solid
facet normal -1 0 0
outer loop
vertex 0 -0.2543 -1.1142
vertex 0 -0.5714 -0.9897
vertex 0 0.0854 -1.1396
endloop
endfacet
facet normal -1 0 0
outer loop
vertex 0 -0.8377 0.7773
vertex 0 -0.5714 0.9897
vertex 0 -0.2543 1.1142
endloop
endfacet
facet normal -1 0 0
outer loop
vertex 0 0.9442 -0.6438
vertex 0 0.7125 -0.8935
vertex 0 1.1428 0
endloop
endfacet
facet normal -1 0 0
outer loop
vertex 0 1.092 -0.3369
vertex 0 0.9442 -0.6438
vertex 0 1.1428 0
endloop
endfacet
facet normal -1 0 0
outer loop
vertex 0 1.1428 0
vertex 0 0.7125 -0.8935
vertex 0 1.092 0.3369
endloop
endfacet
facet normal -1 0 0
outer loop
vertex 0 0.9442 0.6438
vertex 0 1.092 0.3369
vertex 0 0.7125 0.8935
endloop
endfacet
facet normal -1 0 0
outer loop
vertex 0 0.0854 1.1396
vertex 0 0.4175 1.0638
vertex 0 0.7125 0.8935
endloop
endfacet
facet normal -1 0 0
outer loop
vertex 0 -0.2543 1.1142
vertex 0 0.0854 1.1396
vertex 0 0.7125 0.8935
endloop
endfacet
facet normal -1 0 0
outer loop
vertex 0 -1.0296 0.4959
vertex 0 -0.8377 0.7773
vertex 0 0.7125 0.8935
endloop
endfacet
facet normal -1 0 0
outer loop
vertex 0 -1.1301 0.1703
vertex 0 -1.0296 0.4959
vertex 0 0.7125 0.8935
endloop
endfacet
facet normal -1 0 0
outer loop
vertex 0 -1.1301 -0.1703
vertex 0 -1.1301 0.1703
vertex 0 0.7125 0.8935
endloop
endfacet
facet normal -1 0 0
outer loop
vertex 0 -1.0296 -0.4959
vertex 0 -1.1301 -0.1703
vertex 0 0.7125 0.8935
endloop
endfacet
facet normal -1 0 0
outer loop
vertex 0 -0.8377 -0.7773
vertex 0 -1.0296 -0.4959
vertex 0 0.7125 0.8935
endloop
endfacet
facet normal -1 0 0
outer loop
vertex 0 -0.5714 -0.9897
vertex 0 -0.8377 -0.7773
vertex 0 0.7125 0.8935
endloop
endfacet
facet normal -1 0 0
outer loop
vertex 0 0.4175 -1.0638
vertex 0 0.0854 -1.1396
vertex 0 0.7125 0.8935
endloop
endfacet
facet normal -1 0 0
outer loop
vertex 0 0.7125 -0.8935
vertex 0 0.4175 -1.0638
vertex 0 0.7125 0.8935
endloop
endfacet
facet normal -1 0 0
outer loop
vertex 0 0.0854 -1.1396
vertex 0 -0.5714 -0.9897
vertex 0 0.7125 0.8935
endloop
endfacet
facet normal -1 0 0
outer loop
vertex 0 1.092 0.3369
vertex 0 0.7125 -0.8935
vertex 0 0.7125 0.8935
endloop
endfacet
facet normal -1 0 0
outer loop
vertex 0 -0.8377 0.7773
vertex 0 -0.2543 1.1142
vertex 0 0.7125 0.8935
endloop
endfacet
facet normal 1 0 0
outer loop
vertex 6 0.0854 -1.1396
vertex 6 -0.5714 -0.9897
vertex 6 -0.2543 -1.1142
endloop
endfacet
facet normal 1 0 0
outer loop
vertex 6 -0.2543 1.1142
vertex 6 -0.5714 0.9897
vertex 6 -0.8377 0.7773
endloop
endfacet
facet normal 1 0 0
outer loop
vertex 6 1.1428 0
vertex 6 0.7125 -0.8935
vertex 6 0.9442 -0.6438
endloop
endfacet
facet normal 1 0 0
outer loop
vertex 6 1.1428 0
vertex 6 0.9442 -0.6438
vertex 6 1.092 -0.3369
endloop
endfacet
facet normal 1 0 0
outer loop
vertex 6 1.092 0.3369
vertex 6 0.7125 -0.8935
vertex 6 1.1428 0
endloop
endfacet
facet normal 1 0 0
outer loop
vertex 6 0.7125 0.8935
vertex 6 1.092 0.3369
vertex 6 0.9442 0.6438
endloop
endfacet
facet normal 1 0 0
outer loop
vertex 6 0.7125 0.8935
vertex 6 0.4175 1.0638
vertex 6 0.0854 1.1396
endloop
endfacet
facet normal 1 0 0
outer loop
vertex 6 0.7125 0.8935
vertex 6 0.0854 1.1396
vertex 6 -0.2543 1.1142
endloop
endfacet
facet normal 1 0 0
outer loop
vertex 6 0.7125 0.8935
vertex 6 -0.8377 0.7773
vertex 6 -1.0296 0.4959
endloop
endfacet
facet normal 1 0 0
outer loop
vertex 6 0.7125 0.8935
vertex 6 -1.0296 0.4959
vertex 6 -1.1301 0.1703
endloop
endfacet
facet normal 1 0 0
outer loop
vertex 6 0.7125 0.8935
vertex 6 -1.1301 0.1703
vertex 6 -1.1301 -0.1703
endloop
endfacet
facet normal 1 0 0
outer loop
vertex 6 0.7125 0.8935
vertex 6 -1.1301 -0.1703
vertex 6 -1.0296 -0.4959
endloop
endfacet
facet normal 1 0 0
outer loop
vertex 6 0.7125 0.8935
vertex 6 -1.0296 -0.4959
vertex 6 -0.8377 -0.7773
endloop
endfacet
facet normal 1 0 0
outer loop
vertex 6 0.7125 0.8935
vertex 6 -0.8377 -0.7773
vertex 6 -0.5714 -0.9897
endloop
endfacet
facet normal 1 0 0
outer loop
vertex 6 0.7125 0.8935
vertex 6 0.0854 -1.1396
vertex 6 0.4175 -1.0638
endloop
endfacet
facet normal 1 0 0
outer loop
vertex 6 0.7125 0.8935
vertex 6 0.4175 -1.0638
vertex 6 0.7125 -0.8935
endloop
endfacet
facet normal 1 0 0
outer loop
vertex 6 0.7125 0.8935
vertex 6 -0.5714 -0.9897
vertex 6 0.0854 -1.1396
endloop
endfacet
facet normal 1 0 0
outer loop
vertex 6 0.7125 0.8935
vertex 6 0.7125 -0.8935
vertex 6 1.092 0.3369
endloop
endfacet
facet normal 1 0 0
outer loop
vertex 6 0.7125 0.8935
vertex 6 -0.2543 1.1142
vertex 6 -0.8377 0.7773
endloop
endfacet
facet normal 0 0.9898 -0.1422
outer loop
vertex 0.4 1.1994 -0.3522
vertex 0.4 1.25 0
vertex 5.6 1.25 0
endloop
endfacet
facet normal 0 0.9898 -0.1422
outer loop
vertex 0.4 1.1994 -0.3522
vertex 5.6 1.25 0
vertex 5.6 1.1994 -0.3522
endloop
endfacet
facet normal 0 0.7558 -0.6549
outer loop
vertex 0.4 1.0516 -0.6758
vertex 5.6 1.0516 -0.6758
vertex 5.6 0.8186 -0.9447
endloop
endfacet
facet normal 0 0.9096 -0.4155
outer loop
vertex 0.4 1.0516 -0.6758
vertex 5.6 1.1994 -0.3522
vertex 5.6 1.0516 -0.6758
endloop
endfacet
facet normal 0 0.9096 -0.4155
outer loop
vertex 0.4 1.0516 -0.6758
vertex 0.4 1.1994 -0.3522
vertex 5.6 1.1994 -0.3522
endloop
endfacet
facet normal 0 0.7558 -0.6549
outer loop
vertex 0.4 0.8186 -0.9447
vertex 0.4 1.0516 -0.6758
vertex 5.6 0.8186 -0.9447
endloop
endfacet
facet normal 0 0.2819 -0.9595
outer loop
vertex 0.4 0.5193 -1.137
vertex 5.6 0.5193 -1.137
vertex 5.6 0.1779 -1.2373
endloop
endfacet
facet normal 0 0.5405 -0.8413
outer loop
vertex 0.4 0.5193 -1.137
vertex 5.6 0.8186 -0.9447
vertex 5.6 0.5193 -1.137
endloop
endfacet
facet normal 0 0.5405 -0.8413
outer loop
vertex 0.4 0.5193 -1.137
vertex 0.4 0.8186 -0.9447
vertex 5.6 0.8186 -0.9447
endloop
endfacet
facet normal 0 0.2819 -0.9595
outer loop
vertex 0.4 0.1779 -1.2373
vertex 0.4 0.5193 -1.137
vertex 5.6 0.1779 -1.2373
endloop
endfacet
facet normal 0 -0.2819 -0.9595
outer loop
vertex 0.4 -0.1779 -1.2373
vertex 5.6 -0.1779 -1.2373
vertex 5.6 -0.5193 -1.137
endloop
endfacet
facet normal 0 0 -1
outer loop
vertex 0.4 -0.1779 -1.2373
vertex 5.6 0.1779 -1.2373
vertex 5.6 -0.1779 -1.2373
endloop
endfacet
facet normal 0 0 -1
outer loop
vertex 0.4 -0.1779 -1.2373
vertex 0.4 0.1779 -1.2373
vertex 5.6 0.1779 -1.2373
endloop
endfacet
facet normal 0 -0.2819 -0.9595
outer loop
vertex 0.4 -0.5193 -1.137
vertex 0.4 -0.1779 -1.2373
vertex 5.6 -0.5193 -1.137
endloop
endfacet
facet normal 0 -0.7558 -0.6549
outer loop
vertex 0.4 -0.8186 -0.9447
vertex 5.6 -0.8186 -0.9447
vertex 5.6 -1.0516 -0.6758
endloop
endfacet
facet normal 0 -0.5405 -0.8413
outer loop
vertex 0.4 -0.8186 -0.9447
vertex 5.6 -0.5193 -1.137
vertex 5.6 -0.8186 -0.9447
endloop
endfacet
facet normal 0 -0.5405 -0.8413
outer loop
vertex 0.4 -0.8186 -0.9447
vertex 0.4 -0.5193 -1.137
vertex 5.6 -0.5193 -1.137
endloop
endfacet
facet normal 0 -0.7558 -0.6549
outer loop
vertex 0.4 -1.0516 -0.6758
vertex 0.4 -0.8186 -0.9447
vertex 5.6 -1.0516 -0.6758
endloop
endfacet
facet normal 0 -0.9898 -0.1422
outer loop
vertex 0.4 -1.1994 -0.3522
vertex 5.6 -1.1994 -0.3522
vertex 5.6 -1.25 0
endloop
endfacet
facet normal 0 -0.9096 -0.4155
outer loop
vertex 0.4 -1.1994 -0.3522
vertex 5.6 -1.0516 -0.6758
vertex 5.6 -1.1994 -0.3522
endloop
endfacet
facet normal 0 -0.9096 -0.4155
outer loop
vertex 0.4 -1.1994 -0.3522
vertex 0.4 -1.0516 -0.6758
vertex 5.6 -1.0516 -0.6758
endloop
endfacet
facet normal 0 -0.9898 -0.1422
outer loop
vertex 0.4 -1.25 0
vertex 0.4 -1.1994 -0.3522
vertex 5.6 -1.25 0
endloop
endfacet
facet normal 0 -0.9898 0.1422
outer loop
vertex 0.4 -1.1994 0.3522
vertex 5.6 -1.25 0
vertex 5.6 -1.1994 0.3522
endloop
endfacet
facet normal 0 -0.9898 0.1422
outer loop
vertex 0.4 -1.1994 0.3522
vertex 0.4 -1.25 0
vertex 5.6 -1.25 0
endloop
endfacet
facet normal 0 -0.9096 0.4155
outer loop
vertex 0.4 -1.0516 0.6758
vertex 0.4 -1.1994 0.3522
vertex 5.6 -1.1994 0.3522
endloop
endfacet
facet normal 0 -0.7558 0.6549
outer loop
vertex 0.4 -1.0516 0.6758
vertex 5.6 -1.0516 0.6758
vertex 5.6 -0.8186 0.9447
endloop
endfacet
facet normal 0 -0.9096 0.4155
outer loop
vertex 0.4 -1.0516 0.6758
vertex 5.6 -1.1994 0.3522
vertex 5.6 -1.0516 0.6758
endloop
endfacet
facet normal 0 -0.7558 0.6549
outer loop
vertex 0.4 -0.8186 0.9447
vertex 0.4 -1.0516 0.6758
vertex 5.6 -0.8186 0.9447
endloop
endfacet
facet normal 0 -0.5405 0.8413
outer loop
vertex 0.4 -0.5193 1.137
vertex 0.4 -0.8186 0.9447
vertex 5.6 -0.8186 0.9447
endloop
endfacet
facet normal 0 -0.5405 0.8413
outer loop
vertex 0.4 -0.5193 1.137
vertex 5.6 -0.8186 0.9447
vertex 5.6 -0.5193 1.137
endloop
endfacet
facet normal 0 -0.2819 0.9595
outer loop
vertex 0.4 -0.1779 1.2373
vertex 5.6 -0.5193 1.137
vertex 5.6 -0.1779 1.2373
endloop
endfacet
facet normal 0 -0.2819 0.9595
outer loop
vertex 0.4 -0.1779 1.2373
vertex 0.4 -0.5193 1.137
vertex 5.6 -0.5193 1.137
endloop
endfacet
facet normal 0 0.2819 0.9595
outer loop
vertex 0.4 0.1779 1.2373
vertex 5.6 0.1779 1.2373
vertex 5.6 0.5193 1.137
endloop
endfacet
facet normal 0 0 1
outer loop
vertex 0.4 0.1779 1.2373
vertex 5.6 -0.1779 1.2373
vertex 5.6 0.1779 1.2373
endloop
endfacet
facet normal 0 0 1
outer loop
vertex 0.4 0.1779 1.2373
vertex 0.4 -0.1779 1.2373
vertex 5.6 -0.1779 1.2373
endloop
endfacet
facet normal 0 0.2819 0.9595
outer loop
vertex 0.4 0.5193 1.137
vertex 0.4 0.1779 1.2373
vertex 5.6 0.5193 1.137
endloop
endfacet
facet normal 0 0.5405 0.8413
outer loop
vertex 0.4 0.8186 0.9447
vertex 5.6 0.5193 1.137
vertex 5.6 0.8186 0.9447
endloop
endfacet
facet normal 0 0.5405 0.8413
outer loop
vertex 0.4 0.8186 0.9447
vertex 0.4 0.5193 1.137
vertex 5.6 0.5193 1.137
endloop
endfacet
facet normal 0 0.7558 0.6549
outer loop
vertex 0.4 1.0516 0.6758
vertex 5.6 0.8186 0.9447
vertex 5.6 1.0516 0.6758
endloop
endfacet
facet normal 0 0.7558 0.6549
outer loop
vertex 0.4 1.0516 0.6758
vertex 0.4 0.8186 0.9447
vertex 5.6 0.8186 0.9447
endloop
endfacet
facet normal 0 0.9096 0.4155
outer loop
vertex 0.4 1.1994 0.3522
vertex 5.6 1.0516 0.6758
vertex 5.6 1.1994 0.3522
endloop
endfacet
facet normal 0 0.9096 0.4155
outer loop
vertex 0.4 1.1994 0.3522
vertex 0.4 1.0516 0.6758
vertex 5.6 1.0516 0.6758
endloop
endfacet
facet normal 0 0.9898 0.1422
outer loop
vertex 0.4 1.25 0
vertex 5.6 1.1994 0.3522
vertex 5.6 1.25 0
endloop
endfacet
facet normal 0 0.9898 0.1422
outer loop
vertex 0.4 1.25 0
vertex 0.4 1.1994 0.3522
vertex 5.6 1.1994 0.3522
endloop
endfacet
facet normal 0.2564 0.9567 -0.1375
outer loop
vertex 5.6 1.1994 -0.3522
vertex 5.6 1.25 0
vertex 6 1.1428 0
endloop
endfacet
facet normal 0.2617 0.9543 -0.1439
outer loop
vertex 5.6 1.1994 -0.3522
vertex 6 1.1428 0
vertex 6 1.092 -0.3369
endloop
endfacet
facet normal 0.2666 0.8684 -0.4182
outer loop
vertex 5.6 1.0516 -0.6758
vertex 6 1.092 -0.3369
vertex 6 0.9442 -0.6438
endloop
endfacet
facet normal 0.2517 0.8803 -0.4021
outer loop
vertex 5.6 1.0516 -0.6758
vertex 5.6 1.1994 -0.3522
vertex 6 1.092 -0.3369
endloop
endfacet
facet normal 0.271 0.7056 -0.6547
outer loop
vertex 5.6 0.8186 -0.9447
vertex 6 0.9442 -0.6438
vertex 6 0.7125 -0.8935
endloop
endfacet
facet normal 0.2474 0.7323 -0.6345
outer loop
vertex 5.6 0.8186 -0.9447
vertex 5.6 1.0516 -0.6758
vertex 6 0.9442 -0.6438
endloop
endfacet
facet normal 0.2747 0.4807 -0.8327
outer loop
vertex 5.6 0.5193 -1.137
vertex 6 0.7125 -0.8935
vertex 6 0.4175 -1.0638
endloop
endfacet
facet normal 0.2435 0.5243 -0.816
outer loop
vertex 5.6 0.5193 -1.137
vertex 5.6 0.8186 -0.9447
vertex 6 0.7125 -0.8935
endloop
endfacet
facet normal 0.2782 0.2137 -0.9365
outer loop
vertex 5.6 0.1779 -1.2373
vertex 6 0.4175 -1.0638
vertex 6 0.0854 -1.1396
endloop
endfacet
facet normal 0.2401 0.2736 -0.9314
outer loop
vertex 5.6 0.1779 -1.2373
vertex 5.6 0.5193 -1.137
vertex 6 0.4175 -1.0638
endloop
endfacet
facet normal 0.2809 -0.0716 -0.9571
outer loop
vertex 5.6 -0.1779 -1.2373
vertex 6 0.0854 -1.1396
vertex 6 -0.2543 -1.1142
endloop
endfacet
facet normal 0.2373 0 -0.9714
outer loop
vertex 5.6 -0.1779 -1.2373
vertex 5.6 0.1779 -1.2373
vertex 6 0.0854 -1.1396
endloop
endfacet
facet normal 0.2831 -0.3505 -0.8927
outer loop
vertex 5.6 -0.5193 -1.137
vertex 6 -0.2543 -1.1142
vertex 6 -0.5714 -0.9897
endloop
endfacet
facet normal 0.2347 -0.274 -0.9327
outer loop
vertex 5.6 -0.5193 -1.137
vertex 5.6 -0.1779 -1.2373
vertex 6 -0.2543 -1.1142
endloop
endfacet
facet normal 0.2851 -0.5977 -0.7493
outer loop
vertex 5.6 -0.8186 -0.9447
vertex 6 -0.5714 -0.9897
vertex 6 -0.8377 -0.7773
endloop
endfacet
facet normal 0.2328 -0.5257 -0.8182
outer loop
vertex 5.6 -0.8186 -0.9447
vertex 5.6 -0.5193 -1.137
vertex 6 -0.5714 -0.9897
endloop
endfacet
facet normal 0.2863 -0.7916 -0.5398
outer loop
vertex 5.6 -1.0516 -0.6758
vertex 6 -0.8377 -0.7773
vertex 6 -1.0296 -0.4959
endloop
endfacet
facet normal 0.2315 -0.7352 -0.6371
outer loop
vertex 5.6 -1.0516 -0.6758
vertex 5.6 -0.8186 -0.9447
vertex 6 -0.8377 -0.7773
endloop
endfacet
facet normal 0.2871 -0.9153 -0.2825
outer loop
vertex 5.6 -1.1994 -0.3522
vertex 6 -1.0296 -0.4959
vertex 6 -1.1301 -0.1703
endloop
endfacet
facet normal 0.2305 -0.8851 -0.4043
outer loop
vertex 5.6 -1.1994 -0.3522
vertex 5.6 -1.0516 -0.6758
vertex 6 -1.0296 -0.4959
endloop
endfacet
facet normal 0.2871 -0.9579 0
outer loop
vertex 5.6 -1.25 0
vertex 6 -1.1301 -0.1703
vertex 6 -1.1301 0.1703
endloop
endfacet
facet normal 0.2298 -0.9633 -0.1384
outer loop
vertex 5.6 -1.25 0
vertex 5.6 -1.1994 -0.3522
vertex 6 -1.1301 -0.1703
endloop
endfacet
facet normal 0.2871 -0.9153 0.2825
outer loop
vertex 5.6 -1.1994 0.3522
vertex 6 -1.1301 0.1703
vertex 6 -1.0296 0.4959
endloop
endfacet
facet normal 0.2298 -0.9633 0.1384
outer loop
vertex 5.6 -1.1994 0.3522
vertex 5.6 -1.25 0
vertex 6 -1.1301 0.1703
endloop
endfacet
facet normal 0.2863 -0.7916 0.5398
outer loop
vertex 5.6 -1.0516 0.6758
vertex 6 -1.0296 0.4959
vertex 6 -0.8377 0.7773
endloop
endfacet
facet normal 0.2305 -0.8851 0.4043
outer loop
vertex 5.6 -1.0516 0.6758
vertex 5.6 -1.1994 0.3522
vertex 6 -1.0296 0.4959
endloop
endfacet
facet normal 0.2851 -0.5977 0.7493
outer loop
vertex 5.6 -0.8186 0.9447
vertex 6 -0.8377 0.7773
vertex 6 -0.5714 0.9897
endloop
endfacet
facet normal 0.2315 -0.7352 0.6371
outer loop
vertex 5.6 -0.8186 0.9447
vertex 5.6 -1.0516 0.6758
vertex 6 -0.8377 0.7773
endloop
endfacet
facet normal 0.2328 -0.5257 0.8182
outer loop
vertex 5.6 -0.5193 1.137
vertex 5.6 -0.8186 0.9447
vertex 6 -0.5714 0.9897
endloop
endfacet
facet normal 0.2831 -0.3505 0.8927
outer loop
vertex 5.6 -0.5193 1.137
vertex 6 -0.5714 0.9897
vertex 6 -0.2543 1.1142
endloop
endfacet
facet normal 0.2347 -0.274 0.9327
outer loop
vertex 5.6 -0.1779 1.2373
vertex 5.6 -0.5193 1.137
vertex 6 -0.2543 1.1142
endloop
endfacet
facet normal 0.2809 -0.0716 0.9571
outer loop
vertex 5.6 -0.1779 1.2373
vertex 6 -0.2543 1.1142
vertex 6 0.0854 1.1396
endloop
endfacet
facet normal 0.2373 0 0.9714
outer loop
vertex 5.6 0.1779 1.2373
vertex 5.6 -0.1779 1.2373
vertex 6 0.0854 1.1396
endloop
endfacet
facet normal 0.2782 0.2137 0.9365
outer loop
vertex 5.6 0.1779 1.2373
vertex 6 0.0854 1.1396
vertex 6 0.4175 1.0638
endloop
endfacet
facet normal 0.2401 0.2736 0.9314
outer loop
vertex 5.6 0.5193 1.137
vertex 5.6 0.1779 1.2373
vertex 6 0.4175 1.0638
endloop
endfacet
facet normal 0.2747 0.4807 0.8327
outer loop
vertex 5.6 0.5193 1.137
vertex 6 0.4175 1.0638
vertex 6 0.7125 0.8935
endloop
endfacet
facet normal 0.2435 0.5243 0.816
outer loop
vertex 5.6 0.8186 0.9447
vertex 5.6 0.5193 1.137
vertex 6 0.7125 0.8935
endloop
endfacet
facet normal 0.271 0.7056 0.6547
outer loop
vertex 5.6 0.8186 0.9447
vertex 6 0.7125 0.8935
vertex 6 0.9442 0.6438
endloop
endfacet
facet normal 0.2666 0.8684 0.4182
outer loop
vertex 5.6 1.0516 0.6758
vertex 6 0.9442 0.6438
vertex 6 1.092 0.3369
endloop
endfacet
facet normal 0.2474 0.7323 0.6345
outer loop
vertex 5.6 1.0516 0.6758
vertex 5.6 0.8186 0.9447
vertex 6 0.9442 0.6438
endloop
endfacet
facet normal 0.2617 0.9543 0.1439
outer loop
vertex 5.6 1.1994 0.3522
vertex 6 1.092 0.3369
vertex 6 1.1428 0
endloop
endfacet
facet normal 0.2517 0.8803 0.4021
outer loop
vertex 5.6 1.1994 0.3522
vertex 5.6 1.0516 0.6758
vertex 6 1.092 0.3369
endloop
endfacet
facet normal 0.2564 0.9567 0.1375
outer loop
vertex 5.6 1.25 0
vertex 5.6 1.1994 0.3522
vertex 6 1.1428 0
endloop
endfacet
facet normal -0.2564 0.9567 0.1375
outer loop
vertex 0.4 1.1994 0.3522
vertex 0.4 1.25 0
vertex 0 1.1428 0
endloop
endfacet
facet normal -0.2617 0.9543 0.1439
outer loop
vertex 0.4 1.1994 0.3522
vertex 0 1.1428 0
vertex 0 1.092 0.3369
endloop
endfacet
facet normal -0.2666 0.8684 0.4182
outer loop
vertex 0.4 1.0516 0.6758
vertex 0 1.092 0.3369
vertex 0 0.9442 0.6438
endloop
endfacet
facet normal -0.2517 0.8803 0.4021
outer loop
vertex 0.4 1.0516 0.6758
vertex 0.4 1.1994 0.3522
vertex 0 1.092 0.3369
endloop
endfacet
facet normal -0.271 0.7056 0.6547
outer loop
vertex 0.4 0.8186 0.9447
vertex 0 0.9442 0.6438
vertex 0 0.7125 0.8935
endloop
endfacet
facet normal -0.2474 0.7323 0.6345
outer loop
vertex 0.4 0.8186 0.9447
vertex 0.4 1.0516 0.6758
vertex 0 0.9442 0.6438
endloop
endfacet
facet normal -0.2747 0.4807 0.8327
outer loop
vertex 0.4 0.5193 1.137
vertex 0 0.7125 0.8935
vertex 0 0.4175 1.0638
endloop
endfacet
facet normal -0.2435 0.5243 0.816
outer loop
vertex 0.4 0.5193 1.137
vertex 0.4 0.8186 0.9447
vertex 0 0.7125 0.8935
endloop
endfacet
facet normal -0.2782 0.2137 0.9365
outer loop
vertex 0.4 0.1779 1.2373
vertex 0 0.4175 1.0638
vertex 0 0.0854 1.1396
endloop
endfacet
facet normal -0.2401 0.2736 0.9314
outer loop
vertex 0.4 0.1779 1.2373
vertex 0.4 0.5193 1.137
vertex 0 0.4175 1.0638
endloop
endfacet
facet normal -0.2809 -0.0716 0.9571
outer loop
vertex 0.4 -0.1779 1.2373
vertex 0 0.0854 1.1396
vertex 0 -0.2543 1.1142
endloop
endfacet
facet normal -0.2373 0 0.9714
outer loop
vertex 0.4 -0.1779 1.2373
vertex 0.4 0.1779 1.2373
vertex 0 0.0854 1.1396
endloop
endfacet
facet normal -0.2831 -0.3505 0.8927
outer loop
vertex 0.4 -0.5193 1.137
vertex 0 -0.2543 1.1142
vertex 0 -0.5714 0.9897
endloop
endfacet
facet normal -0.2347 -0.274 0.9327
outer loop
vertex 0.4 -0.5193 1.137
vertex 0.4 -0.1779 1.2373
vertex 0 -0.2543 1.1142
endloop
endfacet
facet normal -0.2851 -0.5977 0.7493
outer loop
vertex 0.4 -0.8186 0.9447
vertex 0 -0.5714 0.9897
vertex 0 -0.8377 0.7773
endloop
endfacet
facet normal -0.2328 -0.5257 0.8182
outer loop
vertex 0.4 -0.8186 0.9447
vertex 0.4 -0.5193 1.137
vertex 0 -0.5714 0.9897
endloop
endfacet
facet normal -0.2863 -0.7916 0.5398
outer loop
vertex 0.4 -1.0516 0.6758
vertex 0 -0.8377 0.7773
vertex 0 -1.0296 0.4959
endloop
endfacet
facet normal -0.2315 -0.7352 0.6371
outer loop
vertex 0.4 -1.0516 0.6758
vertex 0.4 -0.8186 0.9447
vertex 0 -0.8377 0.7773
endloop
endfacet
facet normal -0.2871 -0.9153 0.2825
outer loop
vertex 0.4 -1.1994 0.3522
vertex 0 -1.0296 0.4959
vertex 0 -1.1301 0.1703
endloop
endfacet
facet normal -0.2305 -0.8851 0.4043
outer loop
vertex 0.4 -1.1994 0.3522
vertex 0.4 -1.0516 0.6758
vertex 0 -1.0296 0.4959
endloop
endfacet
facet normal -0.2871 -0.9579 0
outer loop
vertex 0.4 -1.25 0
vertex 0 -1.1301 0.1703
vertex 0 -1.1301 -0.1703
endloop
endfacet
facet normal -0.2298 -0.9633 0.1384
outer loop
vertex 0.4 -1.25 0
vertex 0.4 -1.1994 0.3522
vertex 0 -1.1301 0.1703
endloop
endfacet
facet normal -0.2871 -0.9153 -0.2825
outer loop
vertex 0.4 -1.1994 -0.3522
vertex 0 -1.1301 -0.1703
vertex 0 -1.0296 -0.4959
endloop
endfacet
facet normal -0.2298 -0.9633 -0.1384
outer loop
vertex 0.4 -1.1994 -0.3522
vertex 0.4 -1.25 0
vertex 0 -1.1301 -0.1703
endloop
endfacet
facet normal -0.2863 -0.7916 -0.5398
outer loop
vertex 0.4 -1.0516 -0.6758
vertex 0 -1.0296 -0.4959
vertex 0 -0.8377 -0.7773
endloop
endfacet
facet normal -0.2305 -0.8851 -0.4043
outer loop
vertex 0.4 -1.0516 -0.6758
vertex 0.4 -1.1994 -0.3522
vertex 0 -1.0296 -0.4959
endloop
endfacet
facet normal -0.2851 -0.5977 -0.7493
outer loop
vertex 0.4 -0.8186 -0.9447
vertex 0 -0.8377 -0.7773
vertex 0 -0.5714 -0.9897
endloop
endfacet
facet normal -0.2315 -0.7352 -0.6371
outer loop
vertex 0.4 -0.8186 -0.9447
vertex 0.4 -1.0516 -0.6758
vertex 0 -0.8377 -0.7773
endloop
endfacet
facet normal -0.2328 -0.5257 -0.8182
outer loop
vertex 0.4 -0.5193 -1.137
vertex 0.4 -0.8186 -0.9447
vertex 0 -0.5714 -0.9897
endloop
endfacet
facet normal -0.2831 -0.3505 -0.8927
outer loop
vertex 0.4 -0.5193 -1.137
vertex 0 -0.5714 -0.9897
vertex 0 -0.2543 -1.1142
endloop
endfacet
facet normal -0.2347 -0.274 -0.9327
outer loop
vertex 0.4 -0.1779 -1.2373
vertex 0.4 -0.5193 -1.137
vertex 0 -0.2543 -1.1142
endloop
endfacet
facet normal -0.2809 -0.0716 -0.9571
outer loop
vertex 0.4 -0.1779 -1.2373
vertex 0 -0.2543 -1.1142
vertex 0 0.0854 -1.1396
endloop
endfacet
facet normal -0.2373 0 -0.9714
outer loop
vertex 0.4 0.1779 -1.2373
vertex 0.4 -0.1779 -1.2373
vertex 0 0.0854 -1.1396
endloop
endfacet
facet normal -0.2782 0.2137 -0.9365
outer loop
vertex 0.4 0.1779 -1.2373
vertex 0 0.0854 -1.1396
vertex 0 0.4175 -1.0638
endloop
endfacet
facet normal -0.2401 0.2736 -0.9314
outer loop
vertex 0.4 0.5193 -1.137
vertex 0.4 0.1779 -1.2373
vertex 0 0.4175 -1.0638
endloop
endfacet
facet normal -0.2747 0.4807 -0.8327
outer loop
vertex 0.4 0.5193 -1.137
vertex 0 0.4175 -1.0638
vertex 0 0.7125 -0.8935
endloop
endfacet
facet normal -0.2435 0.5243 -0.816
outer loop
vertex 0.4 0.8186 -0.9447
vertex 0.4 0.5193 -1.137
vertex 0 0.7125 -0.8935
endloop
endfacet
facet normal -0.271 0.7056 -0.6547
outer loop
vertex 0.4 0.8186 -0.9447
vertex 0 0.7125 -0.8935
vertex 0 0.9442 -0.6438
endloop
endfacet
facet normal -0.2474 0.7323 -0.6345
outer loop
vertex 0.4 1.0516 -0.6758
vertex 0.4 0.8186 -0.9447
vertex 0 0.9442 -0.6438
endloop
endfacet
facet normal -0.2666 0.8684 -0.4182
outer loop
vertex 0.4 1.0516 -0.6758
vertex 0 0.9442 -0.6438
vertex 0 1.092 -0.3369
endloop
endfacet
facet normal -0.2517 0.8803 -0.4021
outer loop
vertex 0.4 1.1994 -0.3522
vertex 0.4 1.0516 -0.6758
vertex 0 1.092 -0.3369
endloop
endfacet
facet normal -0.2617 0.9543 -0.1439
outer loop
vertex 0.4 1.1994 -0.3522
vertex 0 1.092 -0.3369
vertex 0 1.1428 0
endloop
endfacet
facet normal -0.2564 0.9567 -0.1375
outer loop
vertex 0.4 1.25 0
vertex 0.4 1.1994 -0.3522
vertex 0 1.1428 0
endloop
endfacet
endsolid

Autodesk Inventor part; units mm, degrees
ref_plane "YZ Plane" through (0, 0, 0) normal (1, 0, 0) x (0, 1, 0)
ref_plane "XZ Plane" through (0, 0, 0) normal (0, 1, 0) x (-1, 0, 0)
ref_plane "XY Plane" through (0, 0, 0) normal (0, 0, 1) x (1, 0, 0)
sketch "Skizze" plane through (0, 0, 0) normal (1, 0, 0) x (0, 1, 0)
  circle A0 centre (0, 0) radius 1.25
  dimension "d1" = 2.5
extrude "Körper" add sketch "Skizze" along normal blind 6
chamfer "Fase1" distance 0.4 angle 15 1 edges at (0, -1.25, 0) measured on face at (4, 1.2338, -0.2005)
chamfer "Skizze2" distance 0.4 angle 15 1 edges at (6, -1.25, 0) measured on face at (4.1333, 1.2459, -0.1006)
equation "\"d1\" = NND"
equation "\"d2\" = NLG"
equation "\"d8\" = PHH"
equation "\"d9\" = FAWI"
equation "\"d12\" = PHH"
equation "\"d4\" = PHH"
equation "\"d5\" = FAWI"
equation "\"d11\" = PHH"
equation "\"NND\" = 2.5"
equation "\"NLG\" = 6"
equation "\"PHH\" = 0.4"
equation "\"FAWI\" = 15deg"
equation "\"KAH\" = 0"
properties part number "ISO 2338 - 2,5 m6 x 6" material "Edelstahl, austenitisch"
